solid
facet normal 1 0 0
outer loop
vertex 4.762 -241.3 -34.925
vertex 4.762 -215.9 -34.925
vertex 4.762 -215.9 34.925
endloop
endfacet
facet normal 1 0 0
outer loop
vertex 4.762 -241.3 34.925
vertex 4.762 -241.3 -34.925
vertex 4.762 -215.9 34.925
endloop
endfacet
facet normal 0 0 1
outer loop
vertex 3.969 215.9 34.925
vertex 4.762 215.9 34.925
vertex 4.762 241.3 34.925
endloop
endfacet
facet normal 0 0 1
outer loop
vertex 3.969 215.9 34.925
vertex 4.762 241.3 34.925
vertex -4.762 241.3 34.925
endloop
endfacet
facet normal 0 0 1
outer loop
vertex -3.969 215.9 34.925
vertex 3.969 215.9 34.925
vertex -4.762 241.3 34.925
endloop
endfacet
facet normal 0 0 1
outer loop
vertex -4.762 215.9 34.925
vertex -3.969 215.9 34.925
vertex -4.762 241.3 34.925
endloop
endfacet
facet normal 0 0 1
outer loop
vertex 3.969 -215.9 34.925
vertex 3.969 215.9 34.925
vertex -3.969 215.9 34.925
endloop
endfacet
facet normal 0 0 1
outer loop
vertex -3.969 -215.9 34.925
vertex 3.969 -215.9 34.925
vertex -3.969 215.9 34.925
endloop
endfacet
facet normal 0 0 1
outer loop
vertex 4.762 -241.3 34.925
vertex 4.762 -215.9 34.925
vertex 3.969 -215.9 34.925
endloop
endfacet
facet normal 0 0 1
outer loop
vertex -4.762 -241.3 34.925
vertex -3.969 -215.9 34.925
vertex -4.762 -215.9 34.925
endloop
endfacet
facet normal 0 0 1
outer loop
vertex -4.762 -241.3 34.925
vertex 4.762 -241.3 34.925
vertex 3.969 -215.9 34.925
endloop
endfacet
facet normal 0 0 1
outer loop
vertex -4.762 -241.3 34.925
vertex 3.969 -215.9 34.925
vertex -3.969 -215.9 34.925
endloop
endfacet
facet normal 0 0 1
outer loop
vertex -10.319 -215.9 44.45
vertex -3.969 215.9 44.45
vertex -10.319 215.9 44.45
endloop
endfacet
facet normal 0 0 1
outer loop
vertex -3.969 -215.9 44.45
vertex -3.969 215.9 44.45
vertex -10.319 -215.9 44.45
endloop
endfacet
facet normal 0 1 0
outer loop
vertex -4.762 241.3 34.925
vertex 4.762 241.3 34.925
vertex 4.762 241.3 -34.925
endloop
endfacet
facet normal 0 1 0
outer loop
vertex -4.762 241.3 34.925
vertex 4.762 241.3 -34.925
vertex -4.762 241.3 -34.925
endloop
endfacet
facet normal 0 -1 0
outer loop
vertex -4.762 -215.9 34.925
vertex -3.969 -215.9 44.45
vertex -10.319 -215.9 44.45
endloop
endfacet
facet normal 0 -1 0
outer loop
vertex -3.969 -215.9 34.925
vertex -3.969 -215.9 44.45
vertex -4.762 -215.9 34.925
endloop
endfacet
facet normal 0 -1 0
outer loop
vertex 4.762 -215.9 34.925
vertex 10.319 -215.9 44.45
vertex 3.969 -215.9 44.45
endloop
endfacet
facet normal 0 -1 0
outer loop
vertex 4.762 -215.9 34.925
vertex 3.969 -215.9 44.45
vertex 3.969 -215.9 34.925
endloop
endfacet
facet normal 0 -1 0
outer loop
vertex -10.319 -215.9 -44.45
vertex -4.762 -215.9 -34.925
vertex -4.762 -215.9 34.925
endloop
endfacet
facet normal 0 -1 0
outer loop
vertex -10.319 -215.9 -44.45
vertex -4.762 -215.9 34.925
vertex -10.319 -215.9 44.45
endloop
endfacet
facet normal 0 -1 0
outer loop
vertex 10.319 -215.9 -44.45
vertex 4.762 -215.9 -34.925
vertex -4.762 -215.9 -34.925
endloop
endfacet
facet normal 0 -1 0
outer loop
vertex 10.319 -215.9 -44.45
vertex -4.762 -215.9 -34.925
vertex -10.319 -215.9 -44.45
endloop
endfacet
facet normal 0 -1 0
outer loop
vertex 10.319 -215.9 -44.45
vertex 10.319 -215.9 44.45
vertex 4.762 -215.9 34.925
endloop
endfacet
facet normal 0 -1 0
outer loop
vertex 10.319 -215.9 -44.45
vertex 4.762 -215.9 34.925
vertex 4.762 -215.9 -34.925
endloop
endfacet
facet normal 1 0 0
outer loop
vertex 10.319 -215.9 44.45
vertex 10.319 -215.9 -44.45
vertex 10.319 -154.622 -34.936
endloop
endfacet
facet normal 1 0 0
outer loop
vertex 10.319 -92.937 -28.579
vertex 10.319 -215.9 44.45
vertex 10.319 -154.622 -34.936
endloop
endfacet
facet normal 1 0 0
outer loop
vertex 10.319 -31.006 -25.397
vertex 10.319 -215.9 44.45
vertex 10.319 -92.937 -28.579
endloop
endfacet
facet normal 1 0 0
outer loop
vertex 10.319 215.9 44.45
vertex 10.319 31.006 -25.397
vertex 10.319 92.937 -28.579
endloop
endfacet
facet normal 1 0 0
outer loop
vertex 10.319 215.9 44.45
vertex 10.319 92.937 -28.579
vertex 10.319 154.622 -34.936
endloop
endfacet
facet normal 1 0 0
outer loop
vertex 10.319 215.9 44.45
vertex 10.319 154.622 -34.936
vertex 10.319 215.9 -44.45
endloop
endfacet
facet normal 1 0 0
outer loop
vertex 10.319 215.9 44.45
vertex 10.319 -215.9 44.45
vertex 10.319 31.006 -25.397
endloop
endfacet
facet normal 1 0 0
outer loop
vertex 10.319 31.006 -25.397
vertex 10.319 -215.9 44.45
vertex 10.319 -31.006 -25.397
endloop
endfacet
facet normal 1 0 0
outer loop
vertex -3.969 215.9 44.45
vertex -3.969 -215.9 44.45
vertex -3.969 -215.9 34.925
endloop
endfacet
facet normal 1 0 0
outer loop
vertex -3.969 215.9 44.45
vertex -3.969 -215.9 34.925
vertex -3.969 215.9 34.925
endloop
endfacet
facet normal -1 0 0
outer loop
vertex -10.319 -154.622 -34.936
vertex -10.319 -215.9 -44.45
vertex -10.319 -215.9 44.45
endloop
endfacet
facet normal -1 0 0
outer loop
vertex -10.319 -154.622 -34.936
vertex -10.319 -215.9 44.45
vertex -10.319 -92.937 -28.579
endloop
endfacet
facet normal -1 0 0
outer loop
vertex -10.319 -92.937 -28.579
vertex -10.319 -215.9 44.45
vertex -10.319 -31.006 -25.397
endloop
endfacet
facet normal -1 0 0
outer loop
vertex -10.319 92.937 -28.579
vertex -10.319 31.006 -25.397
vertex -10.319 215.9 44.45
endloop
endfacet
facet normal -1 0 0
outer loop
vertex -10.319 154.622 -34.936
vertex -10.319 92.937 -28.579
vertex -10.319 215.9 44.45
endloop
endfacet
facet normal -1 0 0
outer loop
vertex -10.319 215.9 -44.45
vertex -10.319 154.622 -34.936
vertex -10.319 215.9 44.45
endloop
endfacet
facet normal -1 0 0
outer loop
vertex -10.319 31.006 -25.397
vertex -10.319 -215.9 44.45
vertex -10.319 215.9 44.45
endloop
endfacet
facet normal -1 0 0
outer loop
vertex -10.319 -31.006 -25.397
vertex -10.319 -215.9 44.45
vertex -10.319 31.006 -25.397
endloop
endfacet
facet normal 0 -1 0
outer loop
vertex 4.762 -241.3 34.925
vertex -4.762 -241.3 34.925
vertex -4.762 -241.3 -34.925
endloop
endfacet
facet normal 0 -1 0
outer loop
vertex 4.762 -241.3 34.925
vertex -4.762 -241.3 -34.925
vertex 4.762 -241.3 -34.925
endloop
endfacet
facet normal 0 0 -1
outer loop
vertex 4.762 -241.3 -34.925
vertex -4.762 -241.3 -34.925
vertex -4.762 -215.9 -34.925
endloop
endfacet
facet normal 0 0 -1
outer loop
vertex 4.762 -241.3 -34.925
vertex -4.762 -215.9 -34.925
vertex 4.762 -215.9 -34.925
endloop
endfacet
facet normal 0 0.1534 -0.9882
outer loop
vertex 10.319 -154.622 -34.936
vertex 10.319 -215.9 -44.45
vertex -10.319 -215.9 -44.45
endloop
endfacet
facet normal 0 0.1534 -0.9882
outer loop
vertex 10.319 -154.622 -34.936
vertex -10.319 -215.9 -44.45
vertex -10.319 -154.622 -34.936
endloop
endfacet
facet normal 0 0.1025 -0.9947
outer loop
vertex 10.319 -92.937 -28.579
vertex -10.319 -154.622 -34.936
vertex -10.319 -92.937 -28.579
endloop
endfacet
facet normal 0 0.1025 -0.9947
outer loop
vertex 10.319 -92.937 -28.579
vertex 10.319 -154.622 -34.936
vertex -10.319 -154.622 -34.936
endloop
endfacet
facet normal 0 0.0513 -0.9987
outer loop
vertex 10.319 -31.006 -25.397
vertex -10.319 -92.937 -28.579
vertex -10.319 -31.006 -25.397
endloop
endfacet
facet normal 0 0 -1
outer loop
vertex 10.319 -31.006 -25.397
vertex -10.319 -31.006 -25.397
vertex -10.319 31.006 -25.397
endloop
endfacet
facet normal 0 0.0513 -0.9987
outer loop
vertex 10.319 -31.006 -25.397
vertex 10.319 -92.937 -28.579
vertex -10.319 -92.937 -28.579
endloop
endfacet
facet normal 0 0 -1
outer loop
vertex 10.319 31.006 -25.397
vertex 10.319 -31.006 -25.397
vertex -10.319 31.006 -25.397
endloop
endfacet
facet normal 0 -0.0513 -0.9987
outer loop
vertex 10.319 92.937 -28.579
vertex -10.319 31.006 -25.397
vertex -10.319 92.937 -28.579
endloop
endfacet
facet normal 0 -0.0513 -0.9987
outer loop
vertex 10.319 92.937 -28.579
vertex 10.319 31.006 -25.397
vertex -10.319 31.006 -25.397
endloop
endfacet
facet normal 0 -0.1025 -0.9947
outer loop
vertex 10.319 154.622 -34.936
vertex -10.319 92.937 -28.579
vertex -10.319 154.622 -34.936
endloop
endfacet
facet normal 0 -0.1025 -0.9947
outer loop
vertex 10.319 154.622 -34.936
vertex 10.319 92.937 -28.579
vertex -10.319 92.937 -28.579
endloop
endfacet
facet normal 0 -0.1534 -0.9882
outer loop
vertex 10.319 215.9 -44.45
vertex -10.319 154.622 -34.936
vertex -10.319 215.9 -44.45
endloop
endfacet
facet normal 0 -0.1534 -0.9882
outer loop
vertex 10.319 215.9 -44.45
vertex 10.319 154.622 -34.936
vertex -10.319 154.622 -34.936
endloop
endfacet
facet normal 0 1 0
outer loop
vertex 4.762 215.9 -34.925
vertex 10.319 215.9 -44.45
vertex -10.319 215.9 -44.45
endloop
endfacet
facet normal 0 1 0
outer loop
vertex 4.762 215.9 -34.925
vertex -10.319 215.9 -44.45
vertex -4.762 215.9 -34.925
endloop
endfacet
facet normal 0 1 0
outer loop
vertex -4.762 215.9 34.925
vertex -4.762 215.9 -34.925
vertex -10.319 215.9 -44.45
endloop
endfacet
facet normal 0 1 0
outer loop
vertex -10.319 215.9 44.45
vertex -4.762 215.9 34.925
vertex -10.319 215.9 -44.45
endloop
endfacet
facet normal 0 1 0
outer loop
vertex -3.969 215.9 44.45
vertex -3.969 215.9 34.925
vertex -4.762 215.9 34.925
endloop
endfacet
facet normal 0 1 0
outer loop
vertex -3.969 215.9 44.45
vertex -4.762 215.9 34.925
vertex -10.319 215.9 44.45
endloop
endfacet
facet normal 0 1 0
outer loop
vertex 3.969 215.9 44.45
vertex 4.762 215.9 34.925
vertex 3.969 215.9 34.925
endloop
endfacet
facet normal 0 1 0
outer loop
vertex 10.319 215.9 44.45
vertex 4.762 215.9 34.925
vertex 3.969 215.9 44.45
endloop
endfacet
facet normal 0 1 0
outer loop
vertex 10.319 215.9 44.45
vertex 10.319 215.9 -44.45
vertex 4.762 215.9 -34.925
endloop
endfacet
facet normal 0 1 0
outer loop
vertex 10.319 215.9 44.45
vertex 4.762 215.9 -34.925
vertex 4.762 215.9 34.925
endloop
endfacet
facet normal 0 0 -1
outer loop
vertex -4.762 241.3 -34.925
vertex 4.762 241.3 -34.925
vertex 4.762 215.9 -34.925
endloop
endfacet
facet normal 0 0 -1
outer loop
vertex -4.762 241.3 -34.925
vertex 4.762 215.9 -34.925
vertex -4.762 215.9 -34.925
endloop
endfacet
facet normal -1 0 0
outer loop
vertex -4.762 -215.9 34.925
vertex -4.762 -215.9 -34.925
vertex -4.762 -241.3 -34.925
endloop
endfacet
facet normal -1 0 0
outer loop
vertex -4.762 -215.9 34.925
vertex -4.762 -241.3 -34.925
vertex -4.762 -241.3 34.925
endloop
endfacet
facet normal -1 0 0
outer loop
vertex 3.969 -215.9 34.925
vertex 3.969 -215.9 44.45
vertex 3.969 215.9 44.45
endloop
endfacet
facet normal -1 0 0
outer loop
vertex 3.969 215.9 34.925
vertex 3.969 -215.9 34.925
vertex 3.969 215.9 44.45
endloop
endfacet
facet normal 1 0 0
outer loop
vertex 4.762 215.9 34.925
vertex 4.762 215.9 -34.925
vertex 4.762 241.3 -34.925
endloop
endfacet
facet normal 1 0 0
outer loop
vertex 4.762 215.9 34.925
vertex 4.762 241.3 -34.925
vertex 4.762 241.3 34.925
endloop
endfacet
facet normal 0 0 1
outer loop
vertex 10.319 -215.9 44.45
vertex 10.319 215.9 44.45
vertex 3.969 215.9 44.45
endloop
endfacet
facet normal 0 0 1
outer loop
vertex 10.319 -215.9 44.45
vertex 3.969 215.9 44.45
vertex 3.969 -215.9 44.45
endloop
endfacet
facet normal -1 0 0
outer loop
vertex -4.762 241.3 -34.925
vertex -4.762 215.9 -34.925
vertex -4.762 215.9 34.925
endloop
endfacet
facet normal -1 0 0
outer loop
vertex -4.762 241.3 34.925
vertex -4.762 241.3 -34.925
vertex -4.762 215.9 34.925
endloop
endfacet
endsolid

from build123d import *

# Parameters (mm, degrees)
F1_DEPTH = 10.31875
F2_W     = 9.525
F2_H     = 69.85
F3_DEPTH = 25.4
F4_W     = 9.525
F4_H     = 69.85
F5_DEPTH = 25.4
F6_W     = 7.9375
F6_H     = 431.8
F7_DEPTH = 9.525


with BuildPart() as f1:
    # F0 (on Right) → F1 (new body, symmetric)
    with BuildSketch(Plane.YZ):
        with BuildLine():
            Line((215.9, 44.45), (-215.9, 44.45))
            Line((-215.9, 44.45), (-215.9, -44.45))
            ThreePointArc((-215.9, -44.45), (0, -24.998684), (215.9, -44.45))
            Line((215.9, -44.45), (215.9, 44.45))
        make_face()
    extrude(amount=F1_DEPTH, both=True)

    # F2 (on face) → F3 (join)
    with BuildSketch(Plane.XZ.offset(215.9)):
        Rectangle(F2_W, F2_H)
    extrude(amount=F3_DEPTH)

    # F4 (on face) → F5 (join)
    with BuildSketch(Plane(origin=(0, 215.9, 0), x_dir=(-1, 0, 0), z_dir=(0, 1, 0))):
        Rectangle(F4_W, F4_H)
    extrude(amount=F5_DEPTH)

    # F6 (on face) → F7 (cut)
    with BuildSketch(Plane.XY.offset(44.45)):
        Rectangle(F6_W, F6_H)
    extrude(amount=-F7_DEPTH, mode=Mode.SUBTRACT)


solid = f1.part
